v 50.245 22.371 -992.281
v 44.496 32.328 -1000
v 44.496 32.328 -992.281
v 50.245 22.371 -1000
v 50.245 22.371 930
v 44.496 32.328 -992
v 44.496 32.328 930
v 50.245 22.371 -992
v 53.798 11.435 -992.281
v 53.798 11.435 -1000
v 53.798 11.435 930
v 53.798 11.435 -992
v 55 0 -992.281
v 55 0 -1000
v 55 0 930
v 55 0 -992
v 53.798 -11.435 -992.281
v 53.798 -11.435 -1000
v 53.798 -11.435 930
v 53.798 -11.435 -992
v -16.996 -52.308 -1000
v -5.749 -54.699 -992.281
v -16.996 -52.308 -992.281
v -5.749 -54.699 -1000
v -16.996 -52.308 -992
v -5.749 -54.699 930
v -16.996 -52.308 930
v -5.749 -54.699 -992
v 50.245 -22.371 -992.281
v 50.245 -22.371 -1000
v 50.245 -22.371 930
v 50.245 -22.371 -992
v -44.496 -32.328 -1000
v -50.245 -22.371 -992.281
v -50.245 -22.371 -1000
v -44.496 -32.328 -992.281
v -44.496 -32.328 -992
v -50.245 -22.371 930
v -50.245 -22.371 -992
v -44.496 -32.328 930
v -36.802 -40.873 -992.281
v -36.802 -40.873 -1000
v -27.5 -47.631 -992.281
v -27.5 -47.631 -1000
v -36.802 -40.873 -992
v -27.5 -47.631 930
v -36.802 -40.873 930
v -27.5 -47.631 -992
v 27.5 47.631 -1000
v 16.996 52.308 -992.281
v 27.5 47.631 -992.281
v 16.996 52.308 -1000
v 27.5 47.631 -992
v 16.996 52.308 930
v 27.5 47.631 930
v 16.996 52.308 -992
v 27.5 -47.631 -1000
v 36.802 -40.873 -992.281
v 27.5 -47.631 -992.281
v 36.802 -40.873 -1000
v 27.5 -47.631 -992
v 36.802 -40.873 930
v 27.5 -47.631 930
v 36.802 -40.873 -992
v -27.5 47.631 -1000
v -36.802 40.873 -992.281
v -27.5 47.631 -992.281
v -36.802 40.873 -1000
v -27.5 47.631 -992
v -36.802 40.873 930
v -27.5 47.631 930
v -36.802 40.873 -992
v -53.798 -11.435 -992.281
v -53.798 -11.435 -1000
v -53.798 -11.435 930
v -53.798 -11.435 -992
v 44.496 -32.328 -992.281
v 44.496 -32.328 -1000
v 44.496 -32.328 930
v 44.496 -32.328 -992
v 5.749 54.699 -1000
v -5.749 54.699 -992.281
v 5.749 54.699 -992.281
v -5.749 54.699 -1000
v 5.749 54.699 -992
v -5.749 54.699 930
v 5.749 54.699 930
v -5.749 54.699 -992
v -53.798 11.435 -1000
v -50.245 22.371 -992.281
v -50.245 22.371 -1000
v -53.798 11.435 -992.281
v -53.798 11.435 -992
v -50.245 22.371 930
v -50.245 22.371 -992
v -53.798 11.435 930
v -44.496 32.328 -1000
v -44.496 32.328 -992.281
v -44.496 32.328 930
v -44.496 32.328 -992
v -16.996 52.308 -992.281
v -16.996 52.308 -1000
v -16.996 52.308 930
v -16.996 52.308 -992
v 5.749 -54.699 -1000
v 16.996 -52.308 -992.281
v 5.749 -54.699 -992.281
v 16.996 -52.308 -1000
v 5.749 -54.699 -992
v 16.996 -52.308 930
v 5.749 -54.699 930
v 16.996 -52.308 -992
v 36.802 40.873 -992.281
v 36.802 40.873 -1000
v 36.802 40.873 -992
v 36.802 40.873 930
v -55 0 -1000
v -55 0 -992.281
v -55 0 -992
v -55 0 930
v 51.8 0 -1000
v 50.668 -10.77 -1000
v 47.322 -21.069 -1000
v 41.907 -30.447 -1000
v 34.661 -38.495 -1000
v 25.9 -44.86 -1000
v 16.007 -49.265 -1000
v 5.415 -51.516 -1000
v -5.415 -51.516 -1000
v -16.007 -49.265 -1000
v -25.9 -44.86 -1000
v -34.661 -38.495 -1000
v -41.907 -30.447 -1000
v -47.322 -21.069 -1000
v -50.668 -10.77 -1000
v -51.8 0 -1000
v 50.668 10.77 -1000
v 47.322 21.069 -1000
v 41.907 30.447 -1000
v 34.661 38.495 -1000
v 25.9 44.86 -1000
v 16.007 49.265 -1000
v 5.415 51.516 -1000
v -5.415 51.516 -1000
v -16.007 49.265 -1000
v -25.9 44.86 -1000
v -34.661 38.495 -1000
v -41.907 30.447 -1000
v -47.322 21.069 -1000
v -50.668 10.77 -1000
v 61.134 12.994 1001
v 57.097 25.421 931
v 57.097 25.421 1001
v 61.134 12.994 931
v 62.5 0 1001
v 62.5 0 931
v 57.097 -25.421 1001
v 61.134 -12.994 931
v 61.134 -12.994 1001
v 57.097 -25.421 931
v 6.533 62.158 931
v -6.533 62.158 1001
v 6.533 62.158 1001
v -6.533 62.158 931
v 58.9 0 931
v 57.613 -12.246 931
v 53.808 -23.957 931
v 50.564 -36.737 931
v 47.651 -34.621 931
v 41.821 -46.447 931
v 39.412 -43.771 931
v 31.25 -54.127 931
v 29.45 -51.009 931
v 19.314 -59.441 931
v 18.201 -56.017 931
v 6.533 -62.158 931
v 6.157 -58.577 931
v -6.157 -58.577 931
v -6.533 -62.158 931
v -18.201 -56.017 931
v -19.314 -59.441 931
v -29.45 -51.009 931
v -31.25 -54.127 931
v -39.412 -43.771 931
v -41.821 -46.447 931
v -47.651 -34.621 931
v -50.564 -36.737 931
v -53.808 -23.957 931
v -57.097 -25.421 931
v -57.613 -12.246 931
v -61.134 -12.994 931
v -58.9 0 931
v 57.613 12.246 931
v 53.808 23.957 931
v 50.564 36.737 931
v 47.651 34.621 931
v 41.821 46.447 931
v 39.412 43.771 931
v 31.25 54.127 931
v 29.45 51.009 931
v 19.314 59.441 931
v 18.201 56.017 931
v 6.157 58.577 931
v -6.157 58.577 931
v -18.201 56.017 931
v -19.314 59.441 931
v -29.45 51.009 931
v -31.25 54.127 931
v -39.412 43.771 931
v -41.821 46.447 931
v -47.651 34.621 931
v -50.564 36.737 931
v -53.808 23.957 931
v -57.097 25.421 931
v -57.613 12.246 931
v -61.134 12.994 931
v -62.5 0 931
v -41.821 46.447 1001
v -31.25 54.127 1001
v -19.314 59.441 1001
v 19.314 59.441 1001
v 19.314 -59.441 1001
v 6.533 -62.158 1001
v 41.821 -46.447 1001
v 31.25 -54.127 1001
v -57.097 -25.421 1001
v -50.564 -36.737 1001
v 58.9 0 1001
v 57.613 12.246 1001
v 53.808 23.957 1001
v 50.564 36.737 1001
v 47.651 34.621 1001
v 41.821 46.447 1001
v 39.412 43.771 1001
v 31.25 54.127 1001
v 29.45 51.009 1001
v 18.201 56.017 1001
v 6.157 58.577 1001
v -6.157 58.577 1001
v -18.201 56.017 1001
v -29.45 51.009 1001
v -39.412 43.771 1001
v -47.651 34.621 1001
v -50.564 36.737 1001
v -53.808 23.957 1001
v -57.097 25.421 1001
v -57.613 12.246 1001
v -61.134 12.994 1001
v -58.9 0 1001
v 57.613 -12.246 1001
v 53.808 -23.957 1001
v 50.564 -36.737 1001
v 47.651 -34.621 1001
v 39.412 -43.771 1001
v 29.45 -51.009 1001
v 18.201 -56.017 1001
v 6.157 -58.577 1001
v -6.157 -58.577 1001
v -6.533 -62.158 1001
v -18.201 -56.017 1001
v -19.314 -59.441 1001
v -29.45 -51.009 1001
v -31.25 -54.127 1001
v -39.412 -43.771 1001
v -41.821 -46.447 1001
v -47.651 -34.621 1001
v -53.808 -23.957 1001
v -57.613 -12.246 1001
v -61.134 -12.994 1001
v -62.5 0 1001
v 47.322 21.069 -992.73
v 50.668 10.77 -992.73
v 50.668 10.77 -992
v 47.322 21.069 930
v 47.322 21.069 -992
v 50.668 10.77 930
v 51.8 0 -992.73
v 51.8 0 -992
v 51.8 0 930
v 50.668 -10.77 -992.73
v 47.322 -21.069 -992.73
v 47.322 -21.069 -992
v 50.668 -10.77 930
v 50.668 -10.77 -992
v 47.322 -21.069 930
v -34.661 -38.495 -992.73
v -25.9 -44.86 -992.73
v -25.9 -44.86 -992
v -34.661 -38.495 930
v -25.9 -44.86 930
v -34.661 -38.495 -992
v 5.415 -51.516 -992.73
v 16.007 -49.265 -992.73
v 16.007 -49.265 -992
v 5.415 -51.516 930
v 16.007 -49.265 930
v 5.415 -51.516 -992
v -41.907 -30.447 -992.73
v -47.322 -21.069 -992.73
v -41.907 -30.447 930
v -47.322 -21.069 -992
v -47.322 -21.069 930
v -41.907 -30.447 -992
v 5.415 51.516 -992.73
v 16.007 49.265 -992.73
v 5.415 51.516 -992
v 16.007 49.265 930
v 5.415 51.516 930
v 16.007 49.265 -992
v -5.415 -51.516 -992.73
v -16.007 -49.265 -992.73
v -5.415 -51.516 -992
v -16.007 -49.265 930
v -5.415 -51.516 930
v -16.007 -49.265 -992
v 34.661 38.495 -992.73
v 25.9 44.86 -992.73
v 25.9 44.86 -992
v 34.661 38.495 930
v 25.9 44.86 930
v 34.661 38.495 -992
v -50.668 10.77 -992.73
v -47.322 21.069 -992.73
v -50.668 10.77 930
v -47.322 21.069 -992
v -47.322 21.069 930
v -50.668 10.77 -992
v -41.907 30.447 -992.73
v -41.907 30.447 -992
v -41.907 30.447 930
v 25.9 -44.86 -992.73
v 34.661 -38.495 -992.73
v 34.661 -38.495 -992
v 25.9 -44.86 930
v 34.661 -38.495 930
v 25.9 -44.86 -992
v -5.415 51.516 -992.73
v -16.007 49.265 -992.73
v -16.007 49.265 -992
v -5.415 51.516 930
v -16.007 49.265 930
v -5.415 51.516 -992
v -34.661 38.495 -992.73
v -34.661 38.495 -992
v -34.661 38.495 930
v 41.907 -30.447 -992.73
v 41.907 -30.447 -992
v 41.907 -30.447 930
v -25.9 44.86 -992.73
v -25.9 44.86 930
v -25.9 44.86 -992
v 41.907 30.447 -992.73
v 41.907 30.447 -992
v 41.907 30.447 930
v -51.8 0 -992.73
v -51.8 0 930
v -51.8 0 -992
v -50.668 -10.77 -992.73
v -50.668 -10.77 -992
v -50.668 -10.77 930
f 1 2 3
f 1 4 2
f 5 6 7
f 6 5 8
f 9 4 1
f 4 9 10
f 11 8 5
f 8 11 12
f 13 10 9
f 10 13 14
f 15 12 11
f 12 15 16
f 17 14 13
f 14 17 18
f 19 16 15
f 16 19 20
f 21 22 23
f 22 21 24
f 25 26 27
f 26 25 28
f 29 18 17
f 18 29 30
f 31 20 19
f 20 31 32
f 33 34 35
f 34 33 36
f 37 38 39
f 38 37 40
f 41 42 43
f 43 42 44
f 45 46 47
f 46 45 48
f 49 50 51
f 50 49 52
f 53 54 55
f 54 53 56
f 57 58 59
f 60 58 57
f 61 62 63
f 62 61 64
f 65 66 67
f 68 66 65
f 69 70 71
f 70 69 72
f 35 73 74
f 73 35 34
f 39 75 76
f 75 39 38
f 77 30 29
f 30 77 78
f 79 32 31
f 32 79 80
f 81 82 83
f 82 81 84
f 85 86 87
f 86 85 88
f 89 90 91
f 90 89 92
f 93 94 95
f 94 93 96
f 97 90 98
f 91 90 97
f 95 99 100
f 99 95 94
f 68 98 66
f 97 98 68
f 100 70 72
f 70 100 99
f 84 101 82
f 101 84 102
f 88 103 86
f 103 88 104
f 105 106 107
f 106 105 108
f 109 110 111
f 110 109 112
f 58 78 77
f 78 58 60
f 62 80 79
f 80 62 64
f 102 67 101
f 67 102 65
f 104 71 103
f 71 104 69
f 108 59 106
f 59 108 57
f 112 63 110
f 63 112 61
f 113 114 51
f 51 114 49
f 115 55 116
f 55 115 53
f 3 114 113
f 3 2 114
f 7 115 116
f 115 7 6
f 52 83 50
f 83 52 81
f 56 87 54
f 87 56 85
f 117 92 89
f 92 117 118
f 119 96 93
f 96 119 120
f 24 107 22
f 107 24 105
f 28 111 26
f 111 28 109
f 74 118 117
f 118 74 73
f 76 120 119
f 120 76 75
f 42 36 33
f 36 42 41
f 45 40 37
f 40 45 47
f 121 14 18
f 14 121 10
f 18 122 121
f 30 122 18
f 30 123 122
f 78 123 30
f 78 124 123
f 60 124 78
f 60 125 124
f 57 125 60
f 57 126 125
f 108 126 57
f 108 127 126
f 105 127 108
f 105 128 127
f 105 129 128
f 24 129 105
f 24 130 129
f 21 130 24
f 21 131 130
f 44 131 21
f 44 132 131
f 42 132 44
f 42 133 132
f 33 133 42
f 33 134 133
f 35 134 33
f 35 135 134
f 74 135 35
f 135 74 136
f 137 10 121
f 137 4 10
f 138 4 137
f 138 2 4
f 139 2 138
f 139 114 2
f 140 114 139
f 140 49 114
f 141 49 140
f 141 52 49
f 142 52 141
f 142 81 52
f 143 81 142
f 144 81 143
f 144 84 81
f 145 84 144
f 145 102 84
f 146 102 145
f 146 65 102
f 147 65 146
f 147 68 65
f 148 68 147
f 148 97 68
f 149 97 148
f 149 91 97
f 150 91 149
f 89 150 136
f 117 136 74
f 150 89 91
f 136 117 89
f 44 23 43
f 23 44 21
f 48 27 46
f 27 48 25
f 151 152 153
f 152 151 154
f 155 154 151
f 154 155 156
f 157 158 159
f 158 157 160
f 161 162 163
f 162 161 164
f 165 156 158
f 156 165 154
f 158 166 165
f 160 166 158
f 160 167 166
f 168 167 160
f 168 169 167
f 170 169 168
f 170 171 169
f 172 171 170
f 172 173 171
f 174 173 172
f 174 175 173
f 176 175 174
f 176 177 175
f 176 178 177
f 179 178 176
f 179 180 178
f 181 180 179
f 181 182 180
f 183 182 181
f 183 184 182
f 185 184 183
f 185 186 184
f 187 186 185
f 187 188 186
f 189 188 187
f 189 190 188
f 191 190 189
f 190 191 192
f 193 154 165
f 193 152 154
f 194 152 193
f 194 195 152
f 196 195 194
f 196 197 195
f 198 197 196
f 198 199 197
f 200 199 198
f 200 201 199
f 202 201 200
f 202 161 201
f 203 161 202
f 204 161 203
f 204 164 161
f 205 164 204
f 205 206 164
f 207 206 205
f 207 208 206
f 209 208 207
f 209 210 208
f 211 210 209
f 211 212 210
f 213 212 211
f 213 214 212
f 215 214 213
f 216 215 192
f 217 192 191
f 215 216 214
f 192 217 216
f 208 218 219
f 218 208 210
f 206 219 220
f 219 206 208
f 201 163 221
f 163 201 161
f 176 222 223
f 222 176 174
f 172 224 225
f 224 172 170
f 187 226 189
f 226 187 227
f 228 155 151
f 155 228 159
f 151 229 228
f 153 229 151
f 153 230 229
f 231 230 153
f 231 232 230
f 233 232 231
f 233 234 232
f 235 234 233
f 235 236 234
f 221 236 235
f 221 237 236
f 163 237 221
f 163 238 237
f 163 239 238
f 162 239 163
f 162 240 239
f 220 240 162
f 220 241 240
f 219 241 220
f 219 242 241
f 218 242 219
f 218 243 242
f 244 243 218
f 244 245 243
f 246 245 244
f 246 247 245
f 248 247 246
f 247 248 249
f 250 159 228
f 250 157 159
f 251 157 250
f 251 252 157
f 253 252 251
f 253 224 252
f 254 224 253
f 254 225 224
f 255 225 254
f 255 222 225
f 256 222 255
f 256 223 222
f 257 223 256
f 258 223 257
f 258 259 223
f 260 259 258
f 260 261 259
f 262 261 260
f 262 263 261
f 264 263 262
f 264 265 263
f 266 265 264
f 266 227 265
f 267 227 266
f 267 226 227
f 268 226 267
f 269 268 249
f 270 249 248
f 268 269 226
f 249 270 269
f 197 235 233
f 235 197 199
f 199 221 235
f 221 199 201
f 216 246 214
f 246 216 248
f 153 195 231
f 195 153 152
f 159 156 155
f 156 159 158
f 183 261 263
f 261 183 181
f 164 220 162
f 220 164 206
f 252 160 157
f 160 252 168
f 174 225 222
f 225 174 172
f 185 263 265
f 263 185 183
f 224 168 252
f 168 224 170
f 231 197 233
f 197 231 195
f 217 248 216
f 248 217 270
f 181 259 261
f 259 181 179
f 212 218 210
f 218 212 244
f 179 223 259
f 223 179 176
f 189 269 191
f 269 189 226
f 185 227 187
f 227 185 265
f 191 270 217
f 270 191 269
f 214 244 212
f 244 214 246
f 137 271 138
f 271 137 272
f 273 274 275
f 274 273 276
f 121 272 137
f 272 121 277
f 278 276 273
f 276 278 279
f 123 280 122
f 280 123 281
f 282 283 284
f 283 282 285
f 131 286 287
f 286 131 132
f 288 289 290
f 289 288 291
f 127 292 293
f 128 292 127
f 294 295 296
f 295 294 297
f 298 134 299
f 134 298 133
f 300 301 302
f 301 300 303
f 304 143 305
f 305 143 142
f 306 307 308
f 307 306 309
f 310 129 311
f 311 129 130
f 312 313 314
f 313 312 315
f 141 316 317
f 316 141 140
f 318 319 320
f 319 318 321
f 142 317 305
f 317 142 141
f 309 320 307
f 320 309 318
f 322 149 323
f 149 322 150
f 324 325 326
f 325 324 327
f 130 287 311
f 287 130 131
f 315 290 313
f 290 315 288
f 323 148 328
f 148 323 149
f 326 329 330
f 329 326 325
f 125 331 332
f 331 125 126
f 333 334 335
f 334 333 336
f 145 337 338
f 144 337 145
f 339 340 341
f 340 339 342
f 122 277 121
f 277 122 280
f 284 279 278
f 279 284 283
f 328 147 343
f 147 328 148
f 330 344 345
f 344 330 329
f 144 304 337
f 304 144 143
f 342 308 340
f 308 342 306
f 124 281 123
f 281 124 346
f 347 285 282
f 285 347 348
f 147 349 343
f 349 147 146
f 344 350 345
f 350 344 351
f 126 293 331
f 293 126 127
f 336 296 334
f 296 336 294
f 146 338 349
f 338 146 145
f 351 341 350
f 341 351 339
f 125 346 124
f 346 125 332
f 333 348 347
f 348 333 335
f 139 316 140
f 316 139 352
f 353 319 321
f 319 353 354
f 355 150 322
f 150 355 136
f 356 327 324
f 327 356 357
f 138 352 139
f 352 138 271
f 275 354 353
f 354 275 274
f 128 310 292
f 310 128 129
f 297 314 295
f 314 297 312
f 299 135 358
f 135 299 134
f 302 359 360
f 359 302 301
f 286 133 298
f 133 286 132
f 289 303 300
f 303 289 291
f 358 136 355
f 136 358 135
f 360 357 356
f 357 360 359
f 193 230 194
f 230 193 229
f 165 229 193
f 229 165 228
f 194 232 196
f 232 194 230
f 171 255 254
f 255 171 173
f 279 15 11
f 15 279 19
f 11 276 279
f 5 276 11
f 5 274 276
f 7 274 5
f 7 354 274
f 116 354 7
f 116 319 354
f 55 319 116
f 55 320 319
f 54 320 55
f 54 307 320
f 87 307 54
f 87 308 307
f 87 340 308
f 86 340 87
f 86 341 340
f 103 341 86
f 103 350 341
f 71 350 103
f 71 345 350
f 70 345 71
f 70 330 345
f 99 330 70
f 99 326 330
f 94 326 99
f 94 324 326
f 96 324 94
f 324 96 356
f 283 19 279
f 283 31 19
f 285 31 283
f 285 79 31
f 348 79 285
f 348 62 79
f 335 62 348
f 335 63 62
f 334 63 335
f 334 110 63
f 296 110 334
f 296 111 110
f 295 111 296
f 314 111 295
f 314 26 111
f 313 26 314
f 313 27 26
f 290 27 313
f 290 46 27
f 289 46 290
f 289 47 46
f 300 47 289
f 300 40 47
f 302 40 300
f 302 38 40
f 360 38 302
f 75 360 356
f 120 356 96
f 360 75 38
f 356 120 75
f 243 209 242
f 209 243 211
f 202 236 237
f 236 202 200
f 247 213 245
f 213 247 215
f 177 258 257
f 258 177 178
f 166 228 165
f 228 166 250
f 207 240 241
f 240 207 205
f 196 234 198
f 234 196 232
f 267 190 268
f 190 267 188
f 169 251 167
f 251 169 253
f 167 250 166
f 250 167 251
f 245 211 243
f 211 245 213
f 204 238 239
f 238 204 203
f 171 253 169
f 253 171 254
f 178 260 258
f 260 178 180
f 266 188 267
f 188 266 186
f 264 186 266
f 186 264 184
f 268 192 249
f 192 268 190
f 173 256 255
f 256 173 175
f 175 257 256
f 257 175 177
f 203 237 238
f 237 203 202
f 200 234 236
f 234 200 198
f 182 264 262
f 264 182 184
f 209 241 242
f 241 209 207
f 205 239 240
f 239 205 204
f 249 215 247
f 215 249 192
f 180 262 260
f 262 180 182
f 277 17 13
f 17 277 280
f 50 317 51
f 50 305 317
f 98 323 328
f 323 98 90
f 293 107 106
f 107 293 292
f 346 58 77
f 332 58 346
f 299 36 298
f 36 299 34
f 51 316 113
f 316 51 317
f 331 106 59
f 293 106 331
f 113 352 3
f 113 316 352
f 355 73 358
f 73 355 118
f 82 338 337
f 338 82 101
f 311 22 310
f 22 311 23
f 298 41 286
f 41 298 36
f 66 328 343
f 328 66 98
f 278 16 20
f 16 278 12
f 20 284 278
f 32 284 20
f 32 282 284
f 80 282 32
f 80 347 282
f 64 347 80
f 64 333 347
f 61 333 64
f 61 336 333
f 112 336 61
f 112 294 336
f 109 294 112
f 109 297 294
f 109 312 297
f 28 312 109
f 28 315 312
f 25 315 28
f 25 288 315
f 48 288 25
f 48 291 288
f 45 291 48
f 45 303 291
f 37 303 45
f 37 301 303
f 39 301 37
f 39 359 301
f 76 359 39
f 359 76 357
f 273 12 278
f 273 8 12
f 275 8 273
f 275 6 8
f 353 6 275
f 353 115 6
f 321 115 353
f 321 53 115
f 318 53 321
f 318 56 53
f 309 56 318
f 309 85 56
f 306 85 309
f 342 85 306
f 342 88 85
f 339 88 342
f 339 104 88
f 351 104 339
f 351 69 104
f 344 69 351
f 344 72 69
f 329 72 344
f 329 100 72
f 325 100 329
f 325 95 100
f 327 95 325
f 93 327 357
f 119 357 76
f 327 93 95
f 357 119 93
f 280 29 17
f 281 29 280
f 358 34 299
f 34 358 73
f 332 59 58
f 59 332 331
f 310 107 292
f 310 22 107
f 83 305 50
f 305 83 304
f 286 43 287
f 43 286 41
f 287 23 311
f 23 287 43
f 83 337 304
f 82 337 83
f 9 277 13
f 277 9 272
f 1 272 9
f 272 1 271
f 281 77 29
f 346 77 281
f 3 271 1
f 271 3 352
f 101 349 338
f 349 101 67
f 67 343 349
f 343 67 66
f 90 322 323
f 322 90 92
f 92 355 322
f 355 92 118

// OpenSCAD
// Parameters
outer_diameter = 110; //[55:220:1]
length = 2000; //[1000:4000:10]
wall_thickness = 3.2; //[1.6:6.4:0.1]
socket_length = 70; //[35:140:1]
socket_outer_diameter = 125; //[112:160:1]
socket_wall_thickness = 3.6; //[1.8:7.2:0.1]
chamfer_length = 8; //[3:20:1]
chamfer_radial = 2; //[1:6:0.5]
overlap = 1; //[0.5:2:0.1]

// Base Shapes
module pipe_body() {
  translate([0, 0, 0])
    cylinder(h=length, r=outer_diameter/2, center=true);
}

module hollow_bore() {
  translate([0, 0, 0])
    cylinder(h=length + 2*overlap, r=outer_diameter/2 - wall_thickness, center=true);
}

module socket_end() {
  translate([0, 0, length/2 - socket_length/2 + overlap])
    cylinder(h=socket_length, r=socket_outer_diameter/2, center=true);
}

module socket_bore() {
  translate([0, 0, length/2 - socket_length/2 + overlap])
    cylinder(h=socket_length + 2*overlap, r=socket_outer_diameter/2 - socket_wall_thickness, center=true);
}

module chamfer_cut_pos() {
  translate([0, 0, length/2 - chamfer_length/2])
    cylinder(h=chamfer_length, r1=outer_diameter/2 + chamfer_radial, r2=0, center=true);
}

module chamfer_cut_neg() {
  translate([0, 0, -length/2 + chamfer_length/2])
    rotate([180, 0, 0])
      cylinder(h=chamfer_length, r1=outer_diameter/2 + chamfer_radial, r2=0, center=true);
}

// Operations
module pipe_plus_socket() {
  union() {
    pipe_body();
    socket_end();
    // Manufacturer marking text is not included as per rules
  }
}

module pipe_hollowed() {
  difference() {
    pipe_plus_socket();
    hollow_bore();
    socket_bore();
  }
}

module chamfered_ends() {
  difference() {
    pipe_hollowed();
    chamfer_cut_pos();
    chamfer_cut_neg();
  }
}

// Final Output
chamfered_ends();
